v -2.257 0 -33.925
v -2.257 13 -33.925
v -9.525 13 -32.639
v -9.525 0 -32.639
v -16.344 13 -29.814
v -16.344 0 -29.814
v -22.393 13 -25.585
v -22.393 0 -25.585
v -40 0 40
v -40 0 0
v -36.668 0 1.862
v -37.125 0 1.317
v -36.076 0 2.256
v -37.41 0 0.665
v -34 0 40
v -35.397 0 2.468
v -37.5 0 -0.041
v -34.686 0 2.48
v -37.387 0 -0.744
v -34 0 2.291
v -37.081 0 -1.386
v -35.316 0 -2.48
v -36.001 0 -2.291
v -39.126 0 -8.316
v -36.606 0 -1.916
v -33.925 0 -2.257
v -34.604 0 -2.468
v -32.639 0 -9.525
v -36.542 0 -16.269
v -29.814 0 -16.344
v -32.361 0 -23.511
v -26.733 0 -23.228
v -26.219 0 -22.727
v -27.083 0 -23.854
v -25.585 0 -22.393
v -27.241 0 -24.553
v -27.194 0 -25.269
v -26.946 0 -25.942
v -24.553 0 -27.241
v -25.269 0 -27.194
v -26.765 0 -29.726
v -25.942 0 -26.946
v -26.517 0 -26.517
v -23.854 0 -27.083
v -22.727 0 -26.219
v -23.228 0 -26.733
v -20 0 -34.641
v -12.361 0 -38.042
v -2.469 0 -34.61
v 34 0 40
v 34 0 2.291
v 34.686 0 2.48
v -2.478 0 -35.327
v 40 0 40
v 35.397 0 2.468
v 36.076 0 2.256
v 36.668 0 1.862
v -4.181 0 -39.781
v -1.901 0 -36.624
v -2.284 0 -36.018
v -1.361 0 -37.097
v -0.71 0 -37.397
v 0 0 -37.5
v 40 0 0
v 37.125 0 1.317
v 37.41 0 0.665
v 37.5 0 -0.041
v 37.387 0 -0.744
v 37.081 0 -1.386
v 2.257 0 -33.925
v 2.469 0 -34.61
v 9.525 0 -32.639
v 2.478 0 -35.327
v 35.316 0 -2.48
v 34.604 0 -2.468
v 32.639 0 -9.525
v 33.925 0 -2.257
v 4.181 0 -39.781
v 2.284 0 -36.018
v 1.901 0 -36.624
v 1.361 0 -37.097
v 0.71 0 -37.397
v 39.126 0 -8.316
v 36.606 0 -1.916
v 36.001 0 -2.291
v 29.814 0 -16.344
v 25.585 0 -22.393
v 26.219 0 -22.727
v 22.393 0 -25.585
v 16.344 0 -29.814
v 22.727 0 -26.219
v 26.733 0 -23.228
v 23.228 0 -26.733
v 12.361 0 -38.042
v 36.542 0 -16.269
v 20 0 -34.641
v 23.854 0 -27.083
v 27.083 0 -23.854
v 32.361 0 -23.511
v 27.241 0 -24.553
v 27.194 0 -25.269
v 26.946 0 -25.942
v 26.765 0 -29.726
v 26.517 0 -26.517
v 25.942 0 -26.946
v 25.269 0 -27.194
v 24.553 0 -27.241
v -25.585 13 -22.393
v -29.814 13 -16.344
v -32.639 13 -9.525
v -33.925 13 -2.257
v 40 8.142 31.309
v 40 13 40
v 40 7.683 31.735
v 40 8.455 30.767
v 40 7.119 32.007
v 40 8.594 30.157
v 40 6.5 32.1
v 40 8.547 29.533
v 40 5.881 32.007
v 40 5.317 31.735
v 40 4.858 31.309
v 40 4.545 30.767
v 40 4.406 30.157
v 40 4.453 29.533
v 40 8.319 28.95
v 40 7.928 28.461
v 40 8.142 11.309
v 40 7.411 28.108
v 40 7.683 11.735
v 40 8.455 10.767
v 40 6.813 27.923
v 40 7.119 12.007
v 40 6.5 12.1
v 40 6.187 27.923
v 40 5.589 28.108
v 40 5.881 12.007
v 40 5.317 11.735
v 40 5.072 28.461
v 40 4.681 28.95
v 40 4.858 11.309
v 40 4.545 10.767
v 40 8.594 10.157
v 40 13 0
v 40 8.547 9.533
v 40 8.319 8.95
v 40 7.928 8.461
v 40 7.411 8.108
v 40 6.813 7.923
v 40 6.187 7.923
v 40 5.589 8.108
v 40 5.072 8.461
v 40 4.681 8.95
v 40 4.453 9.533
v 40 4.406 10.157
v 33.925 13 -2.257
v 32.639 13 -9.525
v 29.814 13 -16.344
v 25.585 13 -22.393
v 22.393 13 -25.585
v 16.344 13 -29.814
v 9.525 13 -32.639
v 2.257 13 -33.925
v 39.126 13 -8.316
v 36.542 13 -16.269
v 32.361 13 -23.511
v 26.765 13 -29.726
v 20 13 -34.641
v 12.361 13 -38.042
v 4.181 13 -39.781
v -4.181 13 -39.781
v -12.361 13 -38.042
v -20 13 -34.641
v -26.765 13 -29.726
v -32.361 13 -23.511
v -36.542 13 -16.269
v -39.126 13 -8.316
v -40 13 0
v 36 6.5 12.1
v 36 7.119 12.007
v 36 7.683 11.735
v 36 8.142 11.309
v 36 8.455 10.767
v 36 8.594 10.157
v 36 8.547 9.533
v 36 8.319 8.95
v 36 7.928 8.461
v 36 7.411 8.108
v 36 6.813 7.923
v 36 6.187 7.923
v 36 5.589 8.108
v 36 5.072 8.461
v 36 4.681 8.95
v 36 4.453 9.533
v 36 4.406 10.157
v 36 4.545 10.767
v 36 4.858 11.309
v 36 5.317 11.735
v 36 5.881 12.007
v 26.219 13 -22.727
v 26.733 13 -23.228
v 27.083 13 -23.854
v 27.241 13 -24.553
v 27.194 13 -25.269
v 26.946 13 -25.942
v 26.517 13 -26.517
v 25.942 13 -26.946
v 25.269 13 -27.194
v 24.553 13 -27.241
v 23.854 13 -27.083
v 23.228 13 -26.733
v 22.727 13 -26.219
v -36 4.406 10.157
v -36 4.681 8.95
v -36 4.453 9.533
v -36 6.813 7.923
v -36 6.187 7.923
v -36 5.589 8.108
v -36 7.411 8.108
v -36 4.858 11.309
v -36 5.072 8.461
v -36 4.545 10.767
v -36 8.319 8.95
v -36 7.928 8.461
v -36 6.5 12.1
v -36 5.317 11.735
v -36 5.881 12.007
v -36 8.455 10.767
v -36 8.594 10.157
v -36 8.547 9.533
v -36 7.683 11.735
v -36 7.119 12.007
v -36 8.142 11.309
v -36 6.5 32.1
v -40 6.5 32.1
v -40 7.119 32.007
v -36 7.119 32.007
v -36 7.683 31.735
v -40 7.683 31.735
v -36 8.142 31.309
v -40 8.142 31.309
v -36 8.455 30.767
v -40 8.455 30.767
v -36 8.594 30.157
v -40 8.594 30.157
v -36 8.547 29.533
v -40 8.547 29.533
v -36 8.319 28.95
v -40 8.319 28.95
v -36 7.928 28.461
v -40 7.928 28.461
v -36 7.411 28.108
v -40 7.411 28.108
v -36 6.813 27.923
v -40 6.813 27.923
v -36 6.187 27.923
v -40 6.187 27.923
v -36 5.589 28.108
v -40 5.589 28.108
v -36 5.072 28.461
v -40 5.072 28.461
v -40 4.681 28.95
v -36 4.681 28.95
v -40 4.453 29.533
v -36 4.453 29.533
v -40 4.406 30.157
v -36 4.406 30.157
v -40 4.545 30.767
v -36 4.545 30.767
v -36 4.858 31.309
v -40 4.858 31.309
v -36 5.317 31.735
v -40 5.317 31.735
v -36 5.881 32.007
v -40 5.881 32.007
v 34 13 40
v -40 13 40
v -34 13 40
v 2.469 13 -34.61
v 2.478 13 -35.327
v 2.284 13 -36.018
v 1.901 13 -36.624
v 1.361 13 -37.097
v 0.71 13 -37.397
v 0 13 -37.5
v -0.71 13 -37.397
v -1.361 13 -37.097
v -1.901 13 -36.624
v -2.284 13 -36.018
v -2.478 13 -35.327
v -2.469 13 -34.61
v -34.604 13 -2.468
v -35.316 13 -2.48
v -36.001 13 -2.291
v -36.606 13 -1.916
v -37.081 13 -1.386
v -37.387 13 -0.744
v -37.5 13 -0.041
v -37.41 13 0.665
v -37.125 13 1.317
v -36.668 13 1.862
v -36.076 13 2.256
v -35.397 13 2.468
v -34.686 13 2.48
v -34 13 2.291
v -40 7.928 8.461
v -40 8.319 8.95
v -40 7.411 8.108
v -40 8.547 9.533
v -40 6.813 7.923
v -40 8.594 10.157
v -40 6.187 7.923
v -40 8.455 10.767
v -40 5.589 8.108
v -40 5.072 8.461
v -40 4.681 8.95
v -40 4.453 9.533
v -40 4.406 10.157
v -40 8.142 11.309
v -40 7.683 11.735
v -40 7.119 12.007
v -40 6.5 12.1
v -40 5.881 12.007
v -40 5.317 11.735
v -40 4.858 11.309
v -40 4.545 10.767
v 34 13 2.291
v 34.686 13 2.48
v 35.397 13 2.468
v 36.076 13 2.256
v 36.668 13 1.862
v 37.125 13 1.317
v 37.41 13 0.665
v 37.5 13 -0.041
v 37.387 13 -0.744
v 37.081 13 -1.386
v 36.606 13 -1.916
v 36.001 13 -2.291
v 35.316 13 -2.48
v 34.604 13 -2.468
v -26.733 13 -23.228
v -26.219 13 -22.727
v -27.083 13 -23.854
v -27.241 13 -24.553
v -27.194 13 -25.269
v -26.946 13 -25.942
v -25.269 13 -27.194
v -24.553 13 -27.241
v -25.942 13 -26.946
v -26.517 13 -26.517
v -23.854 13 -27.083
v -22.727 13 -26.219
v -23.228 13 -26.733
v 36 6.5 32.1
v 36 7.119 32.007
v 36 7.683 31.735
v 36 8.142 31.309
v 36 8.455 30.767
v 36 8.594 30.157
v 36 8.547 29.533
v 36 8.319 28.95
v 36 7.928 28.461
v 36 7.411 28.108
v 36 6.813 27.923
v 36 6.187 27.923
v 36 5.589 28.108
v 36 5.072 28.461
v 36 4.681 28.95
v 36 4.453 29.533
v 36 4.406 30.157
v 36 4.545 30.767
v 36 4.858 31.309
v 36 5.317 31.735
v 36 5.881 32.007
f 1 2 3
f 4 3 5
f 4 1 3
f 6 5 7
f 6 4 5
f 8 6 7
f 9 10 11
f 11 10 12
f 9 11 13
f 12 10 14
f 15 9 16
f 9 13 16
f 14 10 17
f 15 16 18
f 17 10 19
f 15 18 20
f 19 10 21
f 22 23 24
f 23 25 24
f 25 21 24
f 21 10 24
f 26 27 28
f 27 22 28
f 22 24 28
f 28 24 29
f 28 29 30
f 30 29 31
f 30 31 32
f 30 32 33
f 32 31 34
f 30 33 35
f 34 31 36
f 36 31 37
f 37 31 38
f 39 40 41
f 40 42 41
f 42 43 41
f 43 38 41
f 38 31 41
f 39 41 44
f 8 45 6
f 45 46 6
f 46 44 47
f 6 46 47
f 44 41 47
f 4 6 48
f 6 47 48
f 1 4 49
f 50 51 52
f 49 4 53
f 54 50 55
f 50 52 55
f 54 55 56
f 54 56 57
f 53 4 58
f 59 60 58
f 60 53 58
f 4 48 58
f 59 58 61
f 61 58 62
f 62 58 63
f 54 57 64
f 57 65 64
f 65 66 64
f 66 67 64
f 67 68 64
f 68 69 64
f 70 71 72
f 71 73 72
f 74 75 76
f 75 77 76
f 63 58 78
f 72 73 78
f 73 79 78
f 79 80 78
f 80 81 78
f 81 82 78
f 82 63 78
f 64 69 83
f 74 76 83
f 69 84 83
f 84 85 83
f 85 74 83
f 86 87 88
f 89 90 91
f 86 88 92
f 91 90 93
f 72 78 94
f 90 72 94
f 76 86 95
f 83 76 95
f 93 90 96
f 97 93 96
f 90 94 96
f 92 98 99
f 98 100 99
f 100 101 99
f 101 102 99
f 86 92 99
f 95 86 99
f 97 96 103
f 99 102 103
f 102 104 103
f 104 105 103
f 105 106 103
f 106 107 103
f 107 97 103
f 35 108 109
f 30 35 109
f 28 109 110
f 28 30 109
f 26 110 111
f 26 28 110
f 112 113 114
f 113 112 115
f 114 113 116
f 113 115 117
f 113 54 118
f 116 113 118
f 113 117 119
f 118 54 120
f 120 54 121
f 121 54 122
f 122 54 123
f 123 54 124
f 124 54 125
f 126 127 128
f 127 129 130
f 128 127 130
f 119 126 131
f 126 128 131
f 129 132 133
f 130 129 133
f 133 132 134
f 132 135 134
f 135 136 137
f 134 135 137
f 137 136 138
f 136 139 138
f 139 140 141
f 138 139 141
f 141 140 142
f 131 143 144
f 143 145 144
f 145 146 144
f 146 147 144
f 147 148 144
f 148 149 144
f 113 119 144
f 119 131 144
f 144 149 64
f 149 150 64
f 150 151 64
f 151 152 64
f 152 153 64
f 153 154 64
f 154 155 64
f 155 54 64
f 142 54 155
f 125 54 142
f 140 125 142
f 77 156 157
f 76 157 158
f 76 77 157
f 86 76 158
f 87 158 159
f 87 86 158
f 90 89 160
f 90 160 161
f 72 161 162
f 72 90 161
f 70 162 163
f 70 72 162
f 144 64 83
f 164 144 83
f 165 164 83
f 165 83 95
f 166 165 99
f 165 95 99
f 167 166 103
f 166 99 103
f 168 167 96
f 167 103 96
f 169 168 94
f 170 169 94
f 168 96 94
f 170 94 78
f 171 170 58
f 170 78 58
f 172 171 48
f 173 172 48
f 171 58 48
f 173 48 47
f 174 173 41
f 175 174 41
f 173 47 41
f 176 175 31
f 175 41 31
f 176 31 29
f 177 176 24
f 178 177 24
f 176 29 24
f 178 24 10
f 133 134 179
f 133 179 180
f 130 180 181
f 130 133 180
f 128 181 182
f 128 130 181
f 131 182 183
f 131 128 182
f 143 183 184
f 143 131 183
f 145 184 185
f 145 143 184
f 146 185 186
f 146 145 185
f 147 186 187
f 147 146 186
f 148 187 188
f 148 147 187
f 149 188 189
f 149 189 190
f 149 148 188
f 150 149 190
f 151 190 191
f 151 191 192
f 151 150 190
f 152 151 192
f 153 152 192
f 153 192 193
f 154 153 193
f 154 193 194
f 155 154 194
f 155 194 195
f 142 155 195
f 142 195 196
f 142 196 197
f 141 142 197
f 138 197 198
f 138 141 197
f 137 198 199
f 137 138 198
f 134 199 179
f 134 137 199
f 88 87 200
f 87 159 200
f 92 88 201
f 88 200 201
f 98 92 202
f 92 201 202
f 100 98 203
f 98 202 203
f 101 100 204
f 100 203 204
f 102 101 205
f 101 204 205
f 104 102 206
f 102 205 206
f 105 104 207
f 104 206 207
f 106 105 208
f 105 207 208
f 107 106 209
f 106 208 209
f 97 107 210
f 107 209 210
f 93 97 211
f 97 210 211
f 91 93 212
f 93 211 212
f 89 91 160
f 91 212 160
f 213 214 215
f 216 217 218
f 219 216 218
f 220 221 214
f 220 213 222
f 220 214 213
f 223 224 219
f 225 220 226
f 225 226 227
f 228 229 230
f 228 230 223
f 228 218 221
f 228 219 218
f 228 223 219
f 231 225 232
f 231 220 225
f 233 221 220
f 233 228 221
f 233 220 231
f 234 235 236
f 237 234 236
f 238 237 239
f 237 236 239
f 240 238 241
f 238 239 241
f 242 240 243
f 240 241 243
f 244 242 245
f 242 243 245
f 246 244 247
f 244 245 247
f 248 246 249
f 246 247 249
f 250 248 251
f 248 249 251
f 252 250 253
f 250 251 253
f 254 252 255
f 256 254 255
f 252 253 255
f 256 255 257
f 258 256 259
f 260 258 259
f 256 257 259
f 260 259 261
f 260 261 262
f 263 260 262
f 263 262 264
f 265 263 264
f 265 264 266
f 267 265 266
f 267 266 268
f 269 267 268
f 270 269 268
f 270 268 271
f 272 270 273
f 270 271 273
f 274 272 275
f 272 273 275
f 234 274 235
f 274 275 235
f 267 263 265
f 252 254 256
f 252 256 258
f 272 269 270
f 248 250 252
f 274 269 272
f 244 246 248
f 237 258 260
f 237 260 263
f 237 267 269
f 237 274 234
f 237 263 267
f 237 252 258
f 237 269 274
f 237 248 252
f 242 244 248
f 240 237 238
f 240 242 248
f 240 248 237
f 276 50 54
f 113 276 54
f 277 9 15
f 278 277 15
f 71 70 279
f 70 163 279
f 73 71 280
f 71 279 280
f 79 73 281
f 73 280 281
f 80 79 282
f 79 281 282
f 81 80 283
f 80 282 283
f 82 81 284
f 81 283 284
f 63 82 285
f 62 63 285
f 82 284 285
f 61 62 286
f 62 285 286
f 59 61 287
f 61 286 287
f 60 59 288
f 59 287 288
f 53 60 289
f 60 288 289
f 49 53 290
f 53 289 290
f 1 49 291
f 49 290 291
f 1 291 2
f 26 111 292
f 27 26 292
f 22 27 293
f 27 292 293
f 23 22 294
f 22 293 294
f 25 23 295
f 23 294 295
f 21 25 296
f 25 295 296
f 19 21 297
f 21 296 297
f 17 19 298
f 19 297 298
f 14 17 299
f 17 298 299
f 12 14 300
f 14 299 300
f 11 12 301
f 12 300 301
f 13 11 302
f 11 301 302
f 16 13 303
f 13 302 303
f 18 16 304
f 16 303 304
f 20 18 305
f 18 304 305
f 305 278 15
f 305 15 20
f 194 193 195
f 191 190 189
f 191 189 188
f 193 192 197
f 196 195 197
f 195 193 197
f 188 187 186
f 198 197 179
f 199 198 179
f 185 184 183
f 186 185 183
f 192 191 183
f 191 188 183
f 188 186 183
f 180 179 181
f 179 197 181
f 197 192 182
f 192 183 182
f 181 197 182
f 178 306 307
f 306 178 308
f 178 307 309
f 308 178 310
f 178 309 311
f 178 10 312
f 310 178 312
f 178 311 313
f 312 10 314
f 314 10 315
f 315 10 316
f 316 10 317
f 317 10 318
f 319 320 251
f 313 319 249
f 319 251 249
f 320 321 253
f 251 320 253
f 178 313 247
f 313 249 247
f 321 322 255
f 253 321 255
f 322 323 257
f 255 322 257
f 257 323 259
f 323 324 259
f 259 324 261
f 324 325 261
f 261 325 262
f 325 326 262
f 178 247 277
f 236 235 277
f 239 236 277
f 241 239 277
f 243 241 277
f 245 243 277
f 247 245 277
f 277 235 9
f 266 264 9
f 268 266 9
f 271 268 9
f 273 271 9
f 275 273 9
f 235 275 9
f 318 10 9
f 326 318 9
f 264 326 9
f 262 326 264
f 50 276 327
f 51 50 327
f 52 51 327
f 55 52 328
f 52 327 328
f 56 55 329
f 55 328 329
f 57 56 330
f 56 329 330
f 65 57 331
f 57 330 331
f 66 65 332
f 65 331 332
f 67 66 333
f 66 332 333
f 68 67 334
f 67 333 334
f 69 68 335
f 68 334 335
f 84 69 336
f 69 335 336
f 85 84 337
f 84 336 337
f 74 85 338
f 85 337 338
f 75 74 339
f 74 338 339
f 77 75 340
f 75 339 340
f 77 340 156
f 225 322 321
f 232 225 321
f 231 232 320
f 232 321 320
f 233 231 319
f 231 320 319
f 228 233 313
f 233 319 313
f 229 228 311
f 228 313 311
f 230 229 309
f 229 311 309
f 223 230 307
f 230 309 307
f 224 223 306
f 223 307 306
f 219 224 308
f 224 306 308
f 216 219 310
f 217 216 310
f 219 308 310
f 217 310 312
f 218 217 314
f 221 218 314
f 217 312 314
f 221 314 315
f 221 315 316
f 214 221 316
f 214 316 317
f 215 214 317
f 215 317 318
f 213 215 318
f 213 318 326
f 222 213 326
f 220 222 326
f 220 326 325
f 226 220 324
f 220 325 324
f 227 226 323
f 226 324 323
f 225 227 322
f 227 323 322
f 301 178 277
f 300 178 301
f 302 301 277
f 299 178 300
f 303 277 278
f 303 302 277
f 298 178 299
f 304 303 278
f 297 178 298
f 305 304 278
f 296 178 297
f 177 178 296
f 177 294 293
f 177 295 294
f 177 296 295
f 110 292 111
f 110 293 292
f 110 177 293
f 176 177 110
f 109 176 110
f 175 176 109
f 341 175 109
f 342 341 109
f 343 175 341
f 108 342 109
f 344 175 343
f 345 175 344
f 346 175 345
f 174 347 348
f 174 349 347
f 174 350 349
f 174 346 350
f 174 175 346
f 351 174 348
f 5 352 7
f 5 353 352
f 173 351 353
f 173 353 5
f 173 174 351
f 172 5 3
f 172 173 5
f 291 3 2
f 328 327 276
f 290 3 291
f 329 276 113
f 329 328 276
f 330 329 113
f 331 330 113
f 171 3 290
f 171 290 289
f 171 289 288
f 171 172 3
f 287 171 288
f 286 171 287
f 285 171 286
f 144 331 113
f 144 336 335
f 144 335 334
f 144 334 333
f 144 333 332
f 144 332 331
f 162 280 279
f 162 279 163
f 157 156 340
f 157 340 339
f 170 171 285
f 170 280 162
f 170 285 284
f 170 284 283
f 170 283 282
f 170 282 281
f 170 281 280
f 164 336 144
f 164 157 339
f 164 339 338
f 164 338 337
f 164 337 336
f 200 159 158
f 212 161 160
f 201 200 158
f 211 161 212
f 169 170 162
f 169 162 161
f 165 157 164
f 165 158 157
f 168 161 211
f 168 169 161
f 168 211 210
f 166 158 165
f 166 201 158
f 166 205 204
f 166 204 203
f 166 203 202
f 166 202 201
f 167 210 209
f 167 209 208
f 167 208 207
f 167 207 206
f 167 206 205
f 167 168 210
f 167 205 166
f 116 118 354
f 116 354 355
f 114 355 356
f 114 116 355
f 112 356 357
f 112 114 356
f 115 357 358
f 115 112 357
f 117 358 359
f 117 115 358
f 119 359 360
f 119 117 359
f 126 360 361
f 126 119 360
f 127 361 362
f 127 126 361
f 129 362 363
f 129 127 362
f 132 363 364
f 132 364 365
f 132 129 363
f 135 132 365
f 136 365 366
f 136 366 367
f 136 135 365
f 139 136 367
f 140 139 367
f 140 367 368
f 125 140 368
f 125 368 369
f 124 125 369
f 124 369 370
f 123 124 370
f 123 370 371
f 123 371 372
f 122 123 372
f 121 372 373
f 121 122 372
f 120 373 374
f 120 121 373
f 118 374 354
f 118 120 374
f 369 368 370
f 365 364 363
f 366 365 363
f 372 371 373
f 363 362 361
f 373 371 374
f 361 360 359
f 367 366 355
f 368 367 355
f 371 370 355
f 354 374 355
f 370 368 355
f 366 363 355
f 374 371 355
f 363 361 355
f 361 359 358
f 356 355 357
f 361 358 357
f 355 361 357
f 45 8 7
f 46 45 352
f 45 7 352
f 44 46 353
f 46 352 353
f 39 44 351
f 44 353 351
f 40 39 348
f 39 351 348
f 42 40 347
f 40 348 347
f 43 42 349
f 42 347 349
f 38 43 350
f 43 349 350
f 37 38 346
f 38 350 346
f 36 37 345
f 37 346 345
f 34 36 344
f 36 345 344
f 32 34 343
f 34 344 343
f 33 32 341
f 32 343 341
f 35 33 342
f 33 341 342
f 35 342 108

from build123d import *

# Parameters (mm, degrees)
SKETCH_1_R          = 34
EXTRUDE_1_DEPTH     = 13
SKETCH_2_R          = 2.5
CUT_EXTRUDE_1_DEPTH = 59.043087444
SKETCH_3_W          = 68
SKETCH_3_H          = 40
CUT_EXTRUDE_2_DEPTH = 59.043087444
SKETCH_4_R          = 2.1
CUT_EXTRUDE_3_DEPTH = 4


with BuildPart() as part:
    # 草图1 → 凸台-拉伸1 (new body)
    with BuildSketch(Plane(origin=(0, 0, 0), x_dir=(1, 0, 0), z_dir=(0, 1, 0))):
        with BuildLine():
            Line((-40, 0), (-40, -40))
            Line((-40, -40), (40, -40))
            Line((40, -40), (40, 0))
            ThreePointArc((40, 0), (0, 40), (-40, 0))
        make_face()
        with Locations(Location((0, 0, 0), (0, 0, 90))):
            Circle(SKETCH_1_R, mode=Mode.SUBTRACT)
    extrude(amount=EXTRUDE_1_DEPTH)

    # 草图2 → 切除-拉伸1 (cut, through all)
    with BuildSketch(Plane(origin=(0, 13, 0), x_dir=(1, 0, 0), z_dir=(0, 1, 0))):
        with Locations((0, 35)):
            Circle(SKETCH_2_R)
        with Locations((24.748737342, 24.748737342)):
            Circle(SKETCH_2_R)
        with Locations((35, 0)):
            Circle(SKETCH_2_R)
        with Locations((24.748737342, -24.748737342)):
            Circle(SKETCH_2_R)
        with Locations((0, -35)):
            Circle(SKETCH_2_R)
        with Locations((-24.748737342, -24.748737342)):
            Circle(SKETCH_2_R)
        with Locations((-35, 0)):
            Circle(SKETCH_2_R)
        with Locations((-24.748737342, 24.748737342)):
            Circle(SKETCH_2_R)
    extrude(amount=-CUT_EXTRUDE_1_DEPTH, mode=Mode.SUBTRACT)

    # 草图3 → 切除-拉伸2 (cut, through all)
    with BuildSketch(Plane(origin=(0, 13, 0), x_dir=(1, 0, 0), z_dir=(0, 1, 0))):
        with Locations((0, -20)):
            Rectangle(SKETCH_3_W, SKETCH_3_H)
    extrude(amount=-CUT_EXTRUDE_2_DEPTH, mode=Mode.SUBTRACT)

    # 草图4 → 切除-拉伸3 (cut)
    with BuildSketch(Plane.ZY.offset(40)):
        with Locations((10, 6.5)):
            Circle(SKETCH_4_R)
        with Locations((30, 6.5)):
            Circle(SKETCH_4_R)
    cut_extrude_3 = extrude(amount=-CUT_EXTRUDE_3_DEPTH, mode=Mode.SUBTRACT)

    # 镜向1: 切除-拉伸3 across plane
    add(cut_extrude_3.mirror(Plane.ZY), mode=Mode.SUBTRACT)


solid = part.part
